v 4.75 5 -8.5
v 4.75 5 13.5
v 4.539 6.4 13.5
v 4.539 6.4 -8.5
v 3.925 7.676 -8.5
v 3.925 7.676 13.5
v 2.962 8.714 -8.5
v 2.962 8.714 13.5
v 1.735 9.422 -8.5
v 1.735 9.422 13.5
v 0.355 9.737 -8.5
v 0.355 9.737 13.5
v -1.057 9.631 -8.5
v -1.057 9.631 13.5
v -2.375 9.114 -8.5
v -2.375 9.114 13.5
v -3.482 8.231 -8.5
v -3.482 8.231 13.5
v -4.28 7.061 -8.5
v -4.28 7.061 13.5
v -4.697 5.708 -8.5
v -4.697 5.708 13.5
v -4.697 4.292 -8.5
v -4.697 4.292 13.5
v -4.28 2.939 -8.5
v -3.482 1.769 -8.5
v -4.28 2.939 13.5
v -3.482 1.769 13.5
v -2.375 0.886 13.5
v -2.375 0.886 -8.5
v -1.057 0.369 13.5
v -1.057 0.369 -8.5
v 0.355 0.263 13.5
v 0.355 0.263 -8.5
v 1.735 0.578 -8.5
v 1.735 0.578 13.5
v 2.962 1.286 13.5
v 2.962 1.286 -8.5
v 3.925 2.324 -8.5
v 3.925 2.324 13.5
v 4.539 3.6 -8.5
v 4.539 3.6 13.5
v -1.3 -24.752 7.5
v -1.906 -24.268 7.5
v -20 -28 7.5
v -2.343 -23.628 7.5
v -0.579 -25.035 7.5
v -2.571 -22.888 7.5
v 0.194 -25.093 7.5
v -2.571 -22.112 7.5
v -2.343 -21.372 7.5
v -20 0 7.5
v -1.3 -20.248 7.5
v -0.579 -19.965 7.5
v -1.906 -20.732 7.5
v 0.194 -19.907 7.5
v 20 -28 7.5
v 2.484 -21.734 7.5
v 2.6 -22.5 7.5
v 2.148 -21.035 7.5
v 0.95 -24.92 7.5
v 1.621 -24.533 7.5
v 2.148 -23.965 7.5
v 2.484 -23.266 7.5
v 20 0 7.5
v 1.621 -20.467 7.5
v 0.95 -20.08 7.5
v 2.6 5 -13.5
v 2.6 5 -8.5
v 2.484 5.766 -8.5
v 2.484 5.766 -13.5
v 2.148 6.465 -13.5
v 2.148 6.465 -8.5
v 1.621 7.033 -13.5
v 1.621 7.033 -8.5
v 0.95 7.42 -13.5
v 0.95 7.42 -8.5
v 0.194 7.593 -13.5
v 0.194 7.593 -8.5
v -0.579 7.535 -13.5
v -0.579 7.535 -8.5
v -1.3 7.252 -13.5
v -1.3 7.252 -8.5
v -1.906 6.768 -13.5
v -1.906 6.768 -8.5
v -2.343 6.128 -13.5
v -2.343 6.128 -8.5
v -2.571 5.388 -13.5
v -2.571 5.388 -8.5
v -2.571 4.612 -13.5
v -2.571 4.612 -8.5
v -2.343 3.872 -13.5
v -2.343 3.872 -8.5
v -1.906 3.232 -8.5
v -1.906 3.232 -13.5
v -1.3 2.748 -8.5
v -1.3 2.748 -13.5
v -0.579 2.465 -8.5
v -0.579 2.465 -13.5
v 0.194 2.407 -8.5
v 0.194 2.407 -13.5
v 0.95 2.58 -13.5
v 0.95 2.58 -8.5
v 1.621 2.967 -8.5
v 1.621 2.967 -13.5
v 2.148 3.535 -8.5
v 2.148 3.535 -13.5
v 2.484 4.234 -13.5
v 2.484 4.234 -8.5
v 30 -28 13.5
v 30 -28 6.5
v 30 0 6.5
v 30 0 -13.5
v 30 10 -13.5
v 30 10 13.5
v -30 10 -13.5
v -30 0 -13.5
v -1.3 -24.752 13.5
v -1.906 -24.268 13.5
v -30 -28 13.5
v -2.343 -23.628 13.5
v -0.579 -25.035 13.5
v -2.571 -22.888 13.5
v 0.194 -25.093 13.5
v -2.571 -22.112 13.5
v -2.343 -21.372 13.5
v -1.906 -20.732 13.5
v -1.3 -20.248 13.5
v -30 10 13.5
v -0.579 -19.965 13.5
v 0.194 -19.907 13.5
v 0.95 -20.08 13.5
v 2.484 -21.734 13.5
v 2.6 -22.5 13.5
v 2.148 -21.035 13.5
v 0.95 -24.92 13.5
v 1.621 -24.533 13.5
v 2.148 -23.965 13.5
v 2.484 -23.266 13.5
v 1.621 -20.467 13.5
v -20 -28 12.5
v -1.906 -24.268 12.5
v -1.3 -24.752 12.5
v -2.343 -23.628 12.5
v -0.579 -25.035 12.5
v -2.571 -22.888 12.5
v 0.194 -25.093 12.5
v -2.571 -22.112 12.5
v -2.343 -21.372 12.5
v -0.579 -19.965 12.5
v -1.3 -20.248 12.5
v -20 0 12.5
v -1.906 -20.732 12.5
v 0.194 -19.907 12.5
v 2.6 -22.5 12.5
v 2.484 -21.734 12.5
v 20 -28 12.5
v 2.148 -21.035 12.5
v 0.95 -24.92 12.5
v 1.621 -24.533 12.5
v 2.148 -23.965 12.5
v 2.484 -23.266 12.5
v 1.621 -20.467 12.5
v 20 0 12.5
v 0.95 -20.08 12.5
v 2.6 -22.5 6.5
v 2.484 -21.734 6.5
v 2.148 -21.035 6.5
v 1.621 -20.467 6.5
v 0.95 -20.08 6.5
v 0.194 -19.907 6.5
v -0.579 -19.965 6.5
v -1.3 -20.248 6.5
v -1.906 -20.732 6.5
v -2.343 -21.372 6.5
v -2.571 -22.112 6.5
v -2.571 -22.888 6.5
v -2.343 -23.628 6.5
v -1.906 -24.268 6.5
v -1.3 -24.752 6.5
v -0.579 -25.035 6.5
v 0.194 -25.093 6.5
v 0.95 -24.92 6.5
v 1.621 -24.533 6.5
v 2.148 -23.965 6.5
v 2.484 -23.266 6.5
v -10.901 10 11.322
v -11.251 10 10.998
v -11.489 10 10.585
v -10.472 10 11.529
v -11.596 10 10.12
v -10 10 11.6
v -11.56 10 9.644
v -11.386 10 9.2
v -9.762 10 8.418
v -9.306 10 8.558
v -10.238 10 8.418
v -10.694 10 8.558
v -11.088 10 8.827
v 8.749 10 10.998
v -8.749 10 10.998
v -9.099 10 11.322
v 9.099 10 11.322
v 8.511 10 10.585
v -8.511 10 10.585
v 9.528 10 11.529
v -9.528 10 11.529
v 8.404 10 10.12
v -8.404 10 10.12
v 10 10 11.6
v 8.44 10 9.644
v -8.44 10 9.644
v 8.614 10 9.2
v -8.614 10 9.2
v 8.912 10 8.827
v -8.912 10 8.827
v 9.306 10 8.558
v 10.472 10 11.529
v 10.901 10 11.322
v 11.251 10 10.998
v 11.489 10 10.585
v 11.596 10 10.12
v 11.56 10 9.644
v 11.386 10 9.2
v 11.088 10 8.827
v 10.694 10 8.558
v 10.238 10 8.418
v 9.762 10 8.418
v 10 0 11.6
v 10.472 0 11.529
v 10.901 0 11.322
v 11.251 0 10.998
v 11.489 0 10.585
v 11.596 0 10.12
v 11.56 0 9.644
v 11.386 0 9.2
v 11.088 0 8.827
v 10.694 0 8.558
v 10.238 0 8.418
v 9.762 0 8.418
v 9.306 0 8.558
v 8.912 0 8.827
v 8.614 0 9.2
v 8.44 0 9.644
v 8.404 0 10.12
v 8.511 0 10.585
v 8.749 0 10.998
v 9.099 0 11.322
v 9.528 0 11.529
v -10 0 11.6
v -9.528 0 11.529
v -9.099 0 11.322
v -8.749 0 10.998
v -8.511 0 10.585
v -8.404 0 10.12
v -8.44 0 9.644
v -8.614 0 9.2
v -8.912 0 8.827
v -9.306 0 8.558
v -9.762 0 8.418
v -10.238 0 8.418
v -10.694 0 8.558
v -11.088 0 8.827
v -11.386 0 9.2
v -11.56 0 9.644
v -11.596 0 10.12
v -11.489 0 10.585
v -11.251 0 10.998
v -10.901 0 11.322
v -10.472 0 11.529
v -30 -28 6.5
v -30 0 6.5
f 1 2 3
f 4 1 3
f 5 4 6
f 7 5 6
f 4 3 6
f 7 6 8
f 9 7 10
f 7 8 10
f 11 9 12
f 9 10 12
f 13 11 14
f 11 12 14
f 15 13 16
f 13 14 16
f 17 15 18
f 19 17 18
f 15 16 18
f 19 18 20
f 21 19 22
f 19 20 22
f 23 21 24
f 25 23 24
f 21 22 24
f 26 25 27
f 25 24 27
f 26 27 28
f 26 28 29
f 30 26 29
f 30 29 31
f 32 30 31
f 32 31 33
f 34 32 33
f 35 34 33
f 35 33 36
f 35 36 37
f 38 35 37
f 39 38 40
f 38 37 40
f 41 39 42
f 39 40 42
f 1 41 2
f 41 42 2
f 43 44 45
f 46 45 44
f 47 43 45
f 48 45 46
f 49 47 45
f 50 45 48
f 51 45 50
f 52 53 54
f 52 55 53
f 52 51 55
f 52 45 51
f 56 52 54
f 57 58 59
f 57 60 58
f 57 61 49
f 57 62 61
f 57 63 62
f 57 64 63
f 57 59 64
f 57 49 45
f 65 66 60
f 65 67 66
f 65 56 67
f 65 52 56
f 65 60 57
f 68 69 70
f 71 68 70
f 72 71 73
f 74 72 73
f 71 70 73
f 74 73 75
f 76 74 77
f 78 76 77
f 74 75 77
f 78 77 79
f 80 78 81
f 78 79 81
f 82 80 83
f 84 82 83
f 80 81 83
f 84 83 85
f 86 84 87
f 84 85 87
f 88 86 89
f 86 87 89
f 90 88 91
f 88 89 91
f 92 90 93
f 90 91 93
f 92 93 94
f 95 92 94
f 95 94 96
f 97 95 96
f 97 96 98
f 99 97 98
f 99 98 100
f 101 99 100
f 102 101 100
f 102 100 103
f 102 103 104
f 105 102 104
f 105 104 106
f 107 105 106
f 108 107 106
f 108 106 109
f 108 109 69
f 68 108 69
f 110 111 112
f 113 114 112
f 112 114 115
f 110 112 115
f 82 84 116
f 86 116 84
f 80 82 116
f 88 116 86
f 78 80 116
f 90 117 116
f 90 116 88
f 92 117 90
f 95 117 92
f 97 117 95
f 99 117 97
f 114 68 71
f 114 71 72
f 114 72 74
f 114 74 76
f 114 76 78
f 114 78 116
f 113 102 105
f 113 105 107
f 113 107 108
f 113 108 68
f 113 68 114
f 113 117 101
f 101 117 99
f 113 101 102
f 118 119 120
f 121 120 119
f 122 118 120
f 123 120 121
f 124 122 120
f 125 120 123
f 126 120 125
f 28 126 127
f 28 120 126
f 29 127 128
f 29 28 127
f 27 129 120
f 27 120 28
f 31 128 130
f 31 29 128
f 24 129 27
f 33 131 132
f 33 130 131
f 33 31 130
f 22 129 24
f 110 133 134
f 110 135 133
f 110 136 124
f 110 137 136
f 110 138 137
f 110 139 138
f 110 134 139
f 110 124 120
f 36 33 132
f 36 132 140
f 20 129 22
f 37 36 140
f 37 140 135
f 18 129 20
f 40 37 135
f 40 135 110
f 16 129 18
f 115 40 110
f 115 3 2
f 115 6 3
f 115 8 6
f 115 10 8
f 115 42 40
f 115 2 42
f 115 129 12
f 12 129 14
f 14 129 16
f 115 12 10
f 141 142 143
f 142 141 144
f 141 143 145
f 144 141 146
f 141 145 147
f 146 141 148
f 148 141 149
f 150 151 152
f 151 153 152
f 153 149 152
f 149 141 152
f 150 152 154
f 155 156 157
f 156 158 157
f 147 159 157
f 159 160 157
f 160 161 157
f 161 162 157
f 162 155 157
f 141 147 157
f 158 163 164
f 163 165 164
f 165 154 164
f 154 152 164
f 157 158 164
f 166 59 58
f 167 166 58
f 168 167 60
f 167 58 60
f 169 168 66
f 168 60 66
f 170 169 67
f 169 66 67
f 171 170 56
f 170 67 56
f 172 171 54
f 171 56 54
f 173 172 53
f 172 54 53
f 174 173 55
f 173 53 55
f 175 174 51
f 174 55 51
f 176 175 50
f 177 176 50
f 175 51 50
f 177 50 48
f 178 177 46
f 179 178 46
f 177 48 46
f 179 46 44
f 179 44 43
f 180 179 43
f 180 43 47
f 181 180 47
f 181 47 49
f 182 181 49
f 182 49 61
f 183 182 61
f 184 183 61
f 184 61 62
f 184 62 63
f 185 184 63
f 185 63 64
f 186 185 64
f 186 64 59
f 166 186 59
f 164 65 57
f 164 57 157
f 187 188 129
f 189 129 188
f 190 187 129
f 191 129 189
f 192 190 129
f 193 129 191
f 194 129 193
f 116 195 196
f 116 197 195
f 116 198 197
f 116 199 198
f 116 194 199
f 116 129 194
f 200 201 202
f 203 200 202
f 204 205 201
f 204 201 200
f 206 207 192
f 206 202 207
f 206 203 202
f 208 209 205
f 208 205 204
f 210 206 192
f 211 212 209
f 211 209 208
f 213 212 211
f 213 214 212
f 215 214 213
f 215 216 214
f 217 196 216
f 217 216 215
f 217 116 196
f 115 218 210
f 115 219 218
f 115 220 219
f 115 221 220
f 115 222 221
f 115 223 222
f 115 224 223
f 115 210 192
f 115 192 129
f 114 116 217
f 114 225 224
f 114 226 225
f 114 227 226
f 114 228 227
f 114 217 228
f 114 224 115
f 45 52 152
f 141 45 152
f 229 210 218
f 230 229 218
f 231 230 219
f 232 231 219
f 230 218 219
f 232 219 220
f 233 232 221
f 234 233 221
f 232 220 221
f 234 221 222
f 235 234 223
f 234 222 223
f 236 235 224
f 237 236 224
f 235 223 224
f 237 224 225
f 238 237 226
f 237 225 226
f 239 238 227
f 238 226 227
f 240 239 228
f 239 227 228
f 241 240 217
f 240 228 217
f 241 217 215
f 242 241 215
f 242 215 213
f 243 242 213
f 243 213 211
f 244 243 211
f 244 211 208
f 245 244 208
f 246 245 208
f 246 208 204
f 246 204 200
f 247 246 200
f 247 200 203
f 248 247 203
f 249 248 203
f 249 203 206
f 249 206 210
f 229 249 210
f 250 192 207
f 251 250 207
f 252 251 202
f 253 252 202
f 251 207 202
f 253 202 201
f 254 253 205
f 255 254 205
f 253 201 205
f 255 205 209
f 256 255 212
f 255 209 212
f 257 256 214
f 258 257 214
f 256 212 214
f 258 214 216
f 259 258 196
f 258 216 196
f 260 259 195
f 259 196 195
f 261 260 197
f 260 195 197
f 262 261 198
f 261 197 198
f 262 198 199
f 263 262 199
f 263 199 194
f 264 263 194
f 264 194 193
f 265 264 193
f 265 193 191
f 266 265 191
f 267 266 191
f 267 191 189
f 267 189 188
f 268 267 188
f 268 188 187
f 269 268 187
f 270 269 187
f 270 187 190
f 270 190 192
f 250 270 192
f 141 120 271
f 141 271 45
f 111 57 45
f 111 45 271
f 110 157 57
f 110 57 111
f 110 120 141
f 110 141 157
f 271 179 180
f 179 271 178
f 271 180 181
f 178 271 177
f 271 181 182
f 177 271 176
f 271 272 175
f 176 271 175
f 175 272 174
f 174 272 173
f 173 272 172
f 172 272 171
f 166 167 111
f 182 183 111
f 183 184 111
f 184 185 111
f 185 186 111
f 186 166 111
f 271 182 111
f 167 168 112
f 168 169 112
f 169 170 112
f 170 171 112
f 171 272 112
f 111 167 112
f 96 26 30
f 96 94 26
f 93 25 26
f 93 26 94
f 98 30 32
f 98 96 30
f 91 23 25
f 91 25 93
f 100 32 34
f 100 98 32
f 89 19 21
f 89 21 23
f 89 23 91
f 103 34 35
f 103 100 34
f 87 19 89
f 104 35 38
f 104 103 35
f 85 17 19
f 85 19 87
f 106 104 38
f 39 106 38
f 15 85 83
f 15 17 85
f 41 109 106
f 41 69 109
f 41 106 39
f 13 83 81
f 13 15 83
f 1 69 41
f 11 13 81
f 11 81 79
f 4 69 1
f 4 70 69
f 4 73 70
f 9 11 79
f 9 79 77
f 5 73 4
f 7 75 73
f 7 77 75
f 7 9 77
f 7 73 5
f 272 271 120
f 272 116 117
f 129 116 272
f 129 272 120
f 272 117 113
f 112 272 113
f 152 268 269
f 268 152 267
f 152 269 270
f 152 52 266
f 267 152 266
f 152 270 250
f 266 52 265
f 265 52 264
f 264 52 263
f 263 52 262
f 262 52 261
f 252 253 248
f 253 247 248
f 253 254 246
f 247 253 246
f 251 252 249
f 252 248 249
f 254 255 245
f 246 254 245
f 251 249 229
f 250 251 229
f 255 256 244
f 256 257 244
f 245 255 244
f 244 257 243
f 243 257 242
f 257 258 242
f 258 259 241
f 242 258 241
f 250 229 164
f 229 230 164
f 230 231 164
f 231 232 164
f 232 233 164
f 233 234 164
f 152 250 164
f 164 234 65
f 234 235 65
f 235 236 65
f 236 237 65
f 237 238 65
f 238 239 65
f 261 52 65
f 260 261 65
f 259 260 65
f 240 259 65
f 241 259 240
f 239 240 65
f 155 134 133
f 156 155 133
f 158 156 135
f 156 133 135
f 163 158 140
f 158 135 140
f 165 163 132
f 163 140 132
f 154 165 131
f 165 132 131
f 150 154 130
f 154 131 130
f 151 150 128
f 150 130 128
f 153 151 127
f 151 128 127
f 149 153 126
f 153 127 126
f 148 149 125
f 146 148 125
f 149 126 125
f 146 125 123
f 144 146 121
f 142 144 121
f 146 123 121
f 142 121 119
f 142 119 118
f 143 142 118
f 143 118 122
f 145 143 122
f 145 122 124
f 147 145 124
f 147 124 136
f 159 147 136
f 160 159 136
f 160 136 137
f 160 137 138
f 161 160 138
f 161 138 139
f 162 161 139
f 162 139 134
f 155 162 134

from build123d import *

# Parameters (mm, degrees)
SKETCH1_W           = 60
SKETCH1_H           = 27
BOSS_EXTRUDE1_DEPTH = 10
SKETCH2_R           = 2.6
CUT_EXTRUDE1_DEPTH  = 42.581245773
SKETCH3_R           = 4.75
CUT_EXTRUDE2_DEPTH  = 22
SKETCH4_W           = 60
SKETCH4_H           = 7
SKETCH4_W_2         = 40
SKETCH4_H_2         = 5
BOSS_EXTRUDE3_DEPTH = 28
SKETCH5_R           = 2.6
CUT_EXTRUDE3_DEPTH  = 50.122296363
SKETCH6_R           = 1.6
CUT_EXTRUDE4_DEPTH  = 51.261814532


with BuildPart() as part:
    # Sketch1 → Boss-Extrude1 (new body)
    with BuildSketch(Plane(origin=(0, 0, 0), x_dir=(1, 0, 0), z_dir=(0, 1, 0))):
        Rectangle(SKETCH1_W, SKETCH1_H)
    extrude(amount=BOSS_EXTRUDE1_DEPTH)

    # Sketch2 → Cut-Extrude1 (cut, through all)
    with BuildSketch(Plane.XY.offset(13.5)):
        with Locations((0, 5)):
            Circle(SKETCH2_R)
    extrude(amount=-CUT_EXTRUDE1_DEPTH, mode=Mode.SUBTRACT)

    # Sketch3 → Cut-Extrude2 (cut)
    with BuildSketch(Plane.XY.offset(13.5)):
        with Locations((0, 5)):
            Circle(SKETCH3_R)
    extrude(amount=-CUT_EXTRUDE2_DEPTH, mode=Mode.SUBTRACT)

    # Sketch4 → Boss-Extrude3 (add)
    with BuildSketch(Plane.XZ):
        with Locations((0, 10)):
            Rectangle(SKETCH4_W, SKETCH4_H)
        with Locations((0, 10)):
            Rectangle(SKETCH4_W_2, SKETCH4_H_2, mode=Mode.SUBTRACT)
    extrude(amount=BOSS_EXTRUDE3_DEPTH)

    # Sketch5 → Cut-Extrude3 (cut, through all)
    with BuildSketch(Plane.XY.offset(13.5)):
        with Locations((0, -22.5)):
            Circle(SKETCH5_R)
    extrude(amount=-CUT_EXTRUDE3_DEPTH, mode=Mode.SUBTRACT)

    # Sketch6 → Cut-Extrude4 (cut, through all)
    with BuildSketch(Plane(origin=(0, 10, 0), x_dir=(1, 0, 0), z_dir=(0, 1, 0))):
        with Locations(Location((-10, -10, 0), (0, 0, 270))):
            Circle(SKETCH6_R)
        with Locations(Location((10, -10, 0), (0, 0, 270))):
            Circle(SKETCH6_R)
    extrude(amount=-CUT_EXTRUDE4_DEPTH, mode=Mode.SUBTRACT)


solid = part.part
